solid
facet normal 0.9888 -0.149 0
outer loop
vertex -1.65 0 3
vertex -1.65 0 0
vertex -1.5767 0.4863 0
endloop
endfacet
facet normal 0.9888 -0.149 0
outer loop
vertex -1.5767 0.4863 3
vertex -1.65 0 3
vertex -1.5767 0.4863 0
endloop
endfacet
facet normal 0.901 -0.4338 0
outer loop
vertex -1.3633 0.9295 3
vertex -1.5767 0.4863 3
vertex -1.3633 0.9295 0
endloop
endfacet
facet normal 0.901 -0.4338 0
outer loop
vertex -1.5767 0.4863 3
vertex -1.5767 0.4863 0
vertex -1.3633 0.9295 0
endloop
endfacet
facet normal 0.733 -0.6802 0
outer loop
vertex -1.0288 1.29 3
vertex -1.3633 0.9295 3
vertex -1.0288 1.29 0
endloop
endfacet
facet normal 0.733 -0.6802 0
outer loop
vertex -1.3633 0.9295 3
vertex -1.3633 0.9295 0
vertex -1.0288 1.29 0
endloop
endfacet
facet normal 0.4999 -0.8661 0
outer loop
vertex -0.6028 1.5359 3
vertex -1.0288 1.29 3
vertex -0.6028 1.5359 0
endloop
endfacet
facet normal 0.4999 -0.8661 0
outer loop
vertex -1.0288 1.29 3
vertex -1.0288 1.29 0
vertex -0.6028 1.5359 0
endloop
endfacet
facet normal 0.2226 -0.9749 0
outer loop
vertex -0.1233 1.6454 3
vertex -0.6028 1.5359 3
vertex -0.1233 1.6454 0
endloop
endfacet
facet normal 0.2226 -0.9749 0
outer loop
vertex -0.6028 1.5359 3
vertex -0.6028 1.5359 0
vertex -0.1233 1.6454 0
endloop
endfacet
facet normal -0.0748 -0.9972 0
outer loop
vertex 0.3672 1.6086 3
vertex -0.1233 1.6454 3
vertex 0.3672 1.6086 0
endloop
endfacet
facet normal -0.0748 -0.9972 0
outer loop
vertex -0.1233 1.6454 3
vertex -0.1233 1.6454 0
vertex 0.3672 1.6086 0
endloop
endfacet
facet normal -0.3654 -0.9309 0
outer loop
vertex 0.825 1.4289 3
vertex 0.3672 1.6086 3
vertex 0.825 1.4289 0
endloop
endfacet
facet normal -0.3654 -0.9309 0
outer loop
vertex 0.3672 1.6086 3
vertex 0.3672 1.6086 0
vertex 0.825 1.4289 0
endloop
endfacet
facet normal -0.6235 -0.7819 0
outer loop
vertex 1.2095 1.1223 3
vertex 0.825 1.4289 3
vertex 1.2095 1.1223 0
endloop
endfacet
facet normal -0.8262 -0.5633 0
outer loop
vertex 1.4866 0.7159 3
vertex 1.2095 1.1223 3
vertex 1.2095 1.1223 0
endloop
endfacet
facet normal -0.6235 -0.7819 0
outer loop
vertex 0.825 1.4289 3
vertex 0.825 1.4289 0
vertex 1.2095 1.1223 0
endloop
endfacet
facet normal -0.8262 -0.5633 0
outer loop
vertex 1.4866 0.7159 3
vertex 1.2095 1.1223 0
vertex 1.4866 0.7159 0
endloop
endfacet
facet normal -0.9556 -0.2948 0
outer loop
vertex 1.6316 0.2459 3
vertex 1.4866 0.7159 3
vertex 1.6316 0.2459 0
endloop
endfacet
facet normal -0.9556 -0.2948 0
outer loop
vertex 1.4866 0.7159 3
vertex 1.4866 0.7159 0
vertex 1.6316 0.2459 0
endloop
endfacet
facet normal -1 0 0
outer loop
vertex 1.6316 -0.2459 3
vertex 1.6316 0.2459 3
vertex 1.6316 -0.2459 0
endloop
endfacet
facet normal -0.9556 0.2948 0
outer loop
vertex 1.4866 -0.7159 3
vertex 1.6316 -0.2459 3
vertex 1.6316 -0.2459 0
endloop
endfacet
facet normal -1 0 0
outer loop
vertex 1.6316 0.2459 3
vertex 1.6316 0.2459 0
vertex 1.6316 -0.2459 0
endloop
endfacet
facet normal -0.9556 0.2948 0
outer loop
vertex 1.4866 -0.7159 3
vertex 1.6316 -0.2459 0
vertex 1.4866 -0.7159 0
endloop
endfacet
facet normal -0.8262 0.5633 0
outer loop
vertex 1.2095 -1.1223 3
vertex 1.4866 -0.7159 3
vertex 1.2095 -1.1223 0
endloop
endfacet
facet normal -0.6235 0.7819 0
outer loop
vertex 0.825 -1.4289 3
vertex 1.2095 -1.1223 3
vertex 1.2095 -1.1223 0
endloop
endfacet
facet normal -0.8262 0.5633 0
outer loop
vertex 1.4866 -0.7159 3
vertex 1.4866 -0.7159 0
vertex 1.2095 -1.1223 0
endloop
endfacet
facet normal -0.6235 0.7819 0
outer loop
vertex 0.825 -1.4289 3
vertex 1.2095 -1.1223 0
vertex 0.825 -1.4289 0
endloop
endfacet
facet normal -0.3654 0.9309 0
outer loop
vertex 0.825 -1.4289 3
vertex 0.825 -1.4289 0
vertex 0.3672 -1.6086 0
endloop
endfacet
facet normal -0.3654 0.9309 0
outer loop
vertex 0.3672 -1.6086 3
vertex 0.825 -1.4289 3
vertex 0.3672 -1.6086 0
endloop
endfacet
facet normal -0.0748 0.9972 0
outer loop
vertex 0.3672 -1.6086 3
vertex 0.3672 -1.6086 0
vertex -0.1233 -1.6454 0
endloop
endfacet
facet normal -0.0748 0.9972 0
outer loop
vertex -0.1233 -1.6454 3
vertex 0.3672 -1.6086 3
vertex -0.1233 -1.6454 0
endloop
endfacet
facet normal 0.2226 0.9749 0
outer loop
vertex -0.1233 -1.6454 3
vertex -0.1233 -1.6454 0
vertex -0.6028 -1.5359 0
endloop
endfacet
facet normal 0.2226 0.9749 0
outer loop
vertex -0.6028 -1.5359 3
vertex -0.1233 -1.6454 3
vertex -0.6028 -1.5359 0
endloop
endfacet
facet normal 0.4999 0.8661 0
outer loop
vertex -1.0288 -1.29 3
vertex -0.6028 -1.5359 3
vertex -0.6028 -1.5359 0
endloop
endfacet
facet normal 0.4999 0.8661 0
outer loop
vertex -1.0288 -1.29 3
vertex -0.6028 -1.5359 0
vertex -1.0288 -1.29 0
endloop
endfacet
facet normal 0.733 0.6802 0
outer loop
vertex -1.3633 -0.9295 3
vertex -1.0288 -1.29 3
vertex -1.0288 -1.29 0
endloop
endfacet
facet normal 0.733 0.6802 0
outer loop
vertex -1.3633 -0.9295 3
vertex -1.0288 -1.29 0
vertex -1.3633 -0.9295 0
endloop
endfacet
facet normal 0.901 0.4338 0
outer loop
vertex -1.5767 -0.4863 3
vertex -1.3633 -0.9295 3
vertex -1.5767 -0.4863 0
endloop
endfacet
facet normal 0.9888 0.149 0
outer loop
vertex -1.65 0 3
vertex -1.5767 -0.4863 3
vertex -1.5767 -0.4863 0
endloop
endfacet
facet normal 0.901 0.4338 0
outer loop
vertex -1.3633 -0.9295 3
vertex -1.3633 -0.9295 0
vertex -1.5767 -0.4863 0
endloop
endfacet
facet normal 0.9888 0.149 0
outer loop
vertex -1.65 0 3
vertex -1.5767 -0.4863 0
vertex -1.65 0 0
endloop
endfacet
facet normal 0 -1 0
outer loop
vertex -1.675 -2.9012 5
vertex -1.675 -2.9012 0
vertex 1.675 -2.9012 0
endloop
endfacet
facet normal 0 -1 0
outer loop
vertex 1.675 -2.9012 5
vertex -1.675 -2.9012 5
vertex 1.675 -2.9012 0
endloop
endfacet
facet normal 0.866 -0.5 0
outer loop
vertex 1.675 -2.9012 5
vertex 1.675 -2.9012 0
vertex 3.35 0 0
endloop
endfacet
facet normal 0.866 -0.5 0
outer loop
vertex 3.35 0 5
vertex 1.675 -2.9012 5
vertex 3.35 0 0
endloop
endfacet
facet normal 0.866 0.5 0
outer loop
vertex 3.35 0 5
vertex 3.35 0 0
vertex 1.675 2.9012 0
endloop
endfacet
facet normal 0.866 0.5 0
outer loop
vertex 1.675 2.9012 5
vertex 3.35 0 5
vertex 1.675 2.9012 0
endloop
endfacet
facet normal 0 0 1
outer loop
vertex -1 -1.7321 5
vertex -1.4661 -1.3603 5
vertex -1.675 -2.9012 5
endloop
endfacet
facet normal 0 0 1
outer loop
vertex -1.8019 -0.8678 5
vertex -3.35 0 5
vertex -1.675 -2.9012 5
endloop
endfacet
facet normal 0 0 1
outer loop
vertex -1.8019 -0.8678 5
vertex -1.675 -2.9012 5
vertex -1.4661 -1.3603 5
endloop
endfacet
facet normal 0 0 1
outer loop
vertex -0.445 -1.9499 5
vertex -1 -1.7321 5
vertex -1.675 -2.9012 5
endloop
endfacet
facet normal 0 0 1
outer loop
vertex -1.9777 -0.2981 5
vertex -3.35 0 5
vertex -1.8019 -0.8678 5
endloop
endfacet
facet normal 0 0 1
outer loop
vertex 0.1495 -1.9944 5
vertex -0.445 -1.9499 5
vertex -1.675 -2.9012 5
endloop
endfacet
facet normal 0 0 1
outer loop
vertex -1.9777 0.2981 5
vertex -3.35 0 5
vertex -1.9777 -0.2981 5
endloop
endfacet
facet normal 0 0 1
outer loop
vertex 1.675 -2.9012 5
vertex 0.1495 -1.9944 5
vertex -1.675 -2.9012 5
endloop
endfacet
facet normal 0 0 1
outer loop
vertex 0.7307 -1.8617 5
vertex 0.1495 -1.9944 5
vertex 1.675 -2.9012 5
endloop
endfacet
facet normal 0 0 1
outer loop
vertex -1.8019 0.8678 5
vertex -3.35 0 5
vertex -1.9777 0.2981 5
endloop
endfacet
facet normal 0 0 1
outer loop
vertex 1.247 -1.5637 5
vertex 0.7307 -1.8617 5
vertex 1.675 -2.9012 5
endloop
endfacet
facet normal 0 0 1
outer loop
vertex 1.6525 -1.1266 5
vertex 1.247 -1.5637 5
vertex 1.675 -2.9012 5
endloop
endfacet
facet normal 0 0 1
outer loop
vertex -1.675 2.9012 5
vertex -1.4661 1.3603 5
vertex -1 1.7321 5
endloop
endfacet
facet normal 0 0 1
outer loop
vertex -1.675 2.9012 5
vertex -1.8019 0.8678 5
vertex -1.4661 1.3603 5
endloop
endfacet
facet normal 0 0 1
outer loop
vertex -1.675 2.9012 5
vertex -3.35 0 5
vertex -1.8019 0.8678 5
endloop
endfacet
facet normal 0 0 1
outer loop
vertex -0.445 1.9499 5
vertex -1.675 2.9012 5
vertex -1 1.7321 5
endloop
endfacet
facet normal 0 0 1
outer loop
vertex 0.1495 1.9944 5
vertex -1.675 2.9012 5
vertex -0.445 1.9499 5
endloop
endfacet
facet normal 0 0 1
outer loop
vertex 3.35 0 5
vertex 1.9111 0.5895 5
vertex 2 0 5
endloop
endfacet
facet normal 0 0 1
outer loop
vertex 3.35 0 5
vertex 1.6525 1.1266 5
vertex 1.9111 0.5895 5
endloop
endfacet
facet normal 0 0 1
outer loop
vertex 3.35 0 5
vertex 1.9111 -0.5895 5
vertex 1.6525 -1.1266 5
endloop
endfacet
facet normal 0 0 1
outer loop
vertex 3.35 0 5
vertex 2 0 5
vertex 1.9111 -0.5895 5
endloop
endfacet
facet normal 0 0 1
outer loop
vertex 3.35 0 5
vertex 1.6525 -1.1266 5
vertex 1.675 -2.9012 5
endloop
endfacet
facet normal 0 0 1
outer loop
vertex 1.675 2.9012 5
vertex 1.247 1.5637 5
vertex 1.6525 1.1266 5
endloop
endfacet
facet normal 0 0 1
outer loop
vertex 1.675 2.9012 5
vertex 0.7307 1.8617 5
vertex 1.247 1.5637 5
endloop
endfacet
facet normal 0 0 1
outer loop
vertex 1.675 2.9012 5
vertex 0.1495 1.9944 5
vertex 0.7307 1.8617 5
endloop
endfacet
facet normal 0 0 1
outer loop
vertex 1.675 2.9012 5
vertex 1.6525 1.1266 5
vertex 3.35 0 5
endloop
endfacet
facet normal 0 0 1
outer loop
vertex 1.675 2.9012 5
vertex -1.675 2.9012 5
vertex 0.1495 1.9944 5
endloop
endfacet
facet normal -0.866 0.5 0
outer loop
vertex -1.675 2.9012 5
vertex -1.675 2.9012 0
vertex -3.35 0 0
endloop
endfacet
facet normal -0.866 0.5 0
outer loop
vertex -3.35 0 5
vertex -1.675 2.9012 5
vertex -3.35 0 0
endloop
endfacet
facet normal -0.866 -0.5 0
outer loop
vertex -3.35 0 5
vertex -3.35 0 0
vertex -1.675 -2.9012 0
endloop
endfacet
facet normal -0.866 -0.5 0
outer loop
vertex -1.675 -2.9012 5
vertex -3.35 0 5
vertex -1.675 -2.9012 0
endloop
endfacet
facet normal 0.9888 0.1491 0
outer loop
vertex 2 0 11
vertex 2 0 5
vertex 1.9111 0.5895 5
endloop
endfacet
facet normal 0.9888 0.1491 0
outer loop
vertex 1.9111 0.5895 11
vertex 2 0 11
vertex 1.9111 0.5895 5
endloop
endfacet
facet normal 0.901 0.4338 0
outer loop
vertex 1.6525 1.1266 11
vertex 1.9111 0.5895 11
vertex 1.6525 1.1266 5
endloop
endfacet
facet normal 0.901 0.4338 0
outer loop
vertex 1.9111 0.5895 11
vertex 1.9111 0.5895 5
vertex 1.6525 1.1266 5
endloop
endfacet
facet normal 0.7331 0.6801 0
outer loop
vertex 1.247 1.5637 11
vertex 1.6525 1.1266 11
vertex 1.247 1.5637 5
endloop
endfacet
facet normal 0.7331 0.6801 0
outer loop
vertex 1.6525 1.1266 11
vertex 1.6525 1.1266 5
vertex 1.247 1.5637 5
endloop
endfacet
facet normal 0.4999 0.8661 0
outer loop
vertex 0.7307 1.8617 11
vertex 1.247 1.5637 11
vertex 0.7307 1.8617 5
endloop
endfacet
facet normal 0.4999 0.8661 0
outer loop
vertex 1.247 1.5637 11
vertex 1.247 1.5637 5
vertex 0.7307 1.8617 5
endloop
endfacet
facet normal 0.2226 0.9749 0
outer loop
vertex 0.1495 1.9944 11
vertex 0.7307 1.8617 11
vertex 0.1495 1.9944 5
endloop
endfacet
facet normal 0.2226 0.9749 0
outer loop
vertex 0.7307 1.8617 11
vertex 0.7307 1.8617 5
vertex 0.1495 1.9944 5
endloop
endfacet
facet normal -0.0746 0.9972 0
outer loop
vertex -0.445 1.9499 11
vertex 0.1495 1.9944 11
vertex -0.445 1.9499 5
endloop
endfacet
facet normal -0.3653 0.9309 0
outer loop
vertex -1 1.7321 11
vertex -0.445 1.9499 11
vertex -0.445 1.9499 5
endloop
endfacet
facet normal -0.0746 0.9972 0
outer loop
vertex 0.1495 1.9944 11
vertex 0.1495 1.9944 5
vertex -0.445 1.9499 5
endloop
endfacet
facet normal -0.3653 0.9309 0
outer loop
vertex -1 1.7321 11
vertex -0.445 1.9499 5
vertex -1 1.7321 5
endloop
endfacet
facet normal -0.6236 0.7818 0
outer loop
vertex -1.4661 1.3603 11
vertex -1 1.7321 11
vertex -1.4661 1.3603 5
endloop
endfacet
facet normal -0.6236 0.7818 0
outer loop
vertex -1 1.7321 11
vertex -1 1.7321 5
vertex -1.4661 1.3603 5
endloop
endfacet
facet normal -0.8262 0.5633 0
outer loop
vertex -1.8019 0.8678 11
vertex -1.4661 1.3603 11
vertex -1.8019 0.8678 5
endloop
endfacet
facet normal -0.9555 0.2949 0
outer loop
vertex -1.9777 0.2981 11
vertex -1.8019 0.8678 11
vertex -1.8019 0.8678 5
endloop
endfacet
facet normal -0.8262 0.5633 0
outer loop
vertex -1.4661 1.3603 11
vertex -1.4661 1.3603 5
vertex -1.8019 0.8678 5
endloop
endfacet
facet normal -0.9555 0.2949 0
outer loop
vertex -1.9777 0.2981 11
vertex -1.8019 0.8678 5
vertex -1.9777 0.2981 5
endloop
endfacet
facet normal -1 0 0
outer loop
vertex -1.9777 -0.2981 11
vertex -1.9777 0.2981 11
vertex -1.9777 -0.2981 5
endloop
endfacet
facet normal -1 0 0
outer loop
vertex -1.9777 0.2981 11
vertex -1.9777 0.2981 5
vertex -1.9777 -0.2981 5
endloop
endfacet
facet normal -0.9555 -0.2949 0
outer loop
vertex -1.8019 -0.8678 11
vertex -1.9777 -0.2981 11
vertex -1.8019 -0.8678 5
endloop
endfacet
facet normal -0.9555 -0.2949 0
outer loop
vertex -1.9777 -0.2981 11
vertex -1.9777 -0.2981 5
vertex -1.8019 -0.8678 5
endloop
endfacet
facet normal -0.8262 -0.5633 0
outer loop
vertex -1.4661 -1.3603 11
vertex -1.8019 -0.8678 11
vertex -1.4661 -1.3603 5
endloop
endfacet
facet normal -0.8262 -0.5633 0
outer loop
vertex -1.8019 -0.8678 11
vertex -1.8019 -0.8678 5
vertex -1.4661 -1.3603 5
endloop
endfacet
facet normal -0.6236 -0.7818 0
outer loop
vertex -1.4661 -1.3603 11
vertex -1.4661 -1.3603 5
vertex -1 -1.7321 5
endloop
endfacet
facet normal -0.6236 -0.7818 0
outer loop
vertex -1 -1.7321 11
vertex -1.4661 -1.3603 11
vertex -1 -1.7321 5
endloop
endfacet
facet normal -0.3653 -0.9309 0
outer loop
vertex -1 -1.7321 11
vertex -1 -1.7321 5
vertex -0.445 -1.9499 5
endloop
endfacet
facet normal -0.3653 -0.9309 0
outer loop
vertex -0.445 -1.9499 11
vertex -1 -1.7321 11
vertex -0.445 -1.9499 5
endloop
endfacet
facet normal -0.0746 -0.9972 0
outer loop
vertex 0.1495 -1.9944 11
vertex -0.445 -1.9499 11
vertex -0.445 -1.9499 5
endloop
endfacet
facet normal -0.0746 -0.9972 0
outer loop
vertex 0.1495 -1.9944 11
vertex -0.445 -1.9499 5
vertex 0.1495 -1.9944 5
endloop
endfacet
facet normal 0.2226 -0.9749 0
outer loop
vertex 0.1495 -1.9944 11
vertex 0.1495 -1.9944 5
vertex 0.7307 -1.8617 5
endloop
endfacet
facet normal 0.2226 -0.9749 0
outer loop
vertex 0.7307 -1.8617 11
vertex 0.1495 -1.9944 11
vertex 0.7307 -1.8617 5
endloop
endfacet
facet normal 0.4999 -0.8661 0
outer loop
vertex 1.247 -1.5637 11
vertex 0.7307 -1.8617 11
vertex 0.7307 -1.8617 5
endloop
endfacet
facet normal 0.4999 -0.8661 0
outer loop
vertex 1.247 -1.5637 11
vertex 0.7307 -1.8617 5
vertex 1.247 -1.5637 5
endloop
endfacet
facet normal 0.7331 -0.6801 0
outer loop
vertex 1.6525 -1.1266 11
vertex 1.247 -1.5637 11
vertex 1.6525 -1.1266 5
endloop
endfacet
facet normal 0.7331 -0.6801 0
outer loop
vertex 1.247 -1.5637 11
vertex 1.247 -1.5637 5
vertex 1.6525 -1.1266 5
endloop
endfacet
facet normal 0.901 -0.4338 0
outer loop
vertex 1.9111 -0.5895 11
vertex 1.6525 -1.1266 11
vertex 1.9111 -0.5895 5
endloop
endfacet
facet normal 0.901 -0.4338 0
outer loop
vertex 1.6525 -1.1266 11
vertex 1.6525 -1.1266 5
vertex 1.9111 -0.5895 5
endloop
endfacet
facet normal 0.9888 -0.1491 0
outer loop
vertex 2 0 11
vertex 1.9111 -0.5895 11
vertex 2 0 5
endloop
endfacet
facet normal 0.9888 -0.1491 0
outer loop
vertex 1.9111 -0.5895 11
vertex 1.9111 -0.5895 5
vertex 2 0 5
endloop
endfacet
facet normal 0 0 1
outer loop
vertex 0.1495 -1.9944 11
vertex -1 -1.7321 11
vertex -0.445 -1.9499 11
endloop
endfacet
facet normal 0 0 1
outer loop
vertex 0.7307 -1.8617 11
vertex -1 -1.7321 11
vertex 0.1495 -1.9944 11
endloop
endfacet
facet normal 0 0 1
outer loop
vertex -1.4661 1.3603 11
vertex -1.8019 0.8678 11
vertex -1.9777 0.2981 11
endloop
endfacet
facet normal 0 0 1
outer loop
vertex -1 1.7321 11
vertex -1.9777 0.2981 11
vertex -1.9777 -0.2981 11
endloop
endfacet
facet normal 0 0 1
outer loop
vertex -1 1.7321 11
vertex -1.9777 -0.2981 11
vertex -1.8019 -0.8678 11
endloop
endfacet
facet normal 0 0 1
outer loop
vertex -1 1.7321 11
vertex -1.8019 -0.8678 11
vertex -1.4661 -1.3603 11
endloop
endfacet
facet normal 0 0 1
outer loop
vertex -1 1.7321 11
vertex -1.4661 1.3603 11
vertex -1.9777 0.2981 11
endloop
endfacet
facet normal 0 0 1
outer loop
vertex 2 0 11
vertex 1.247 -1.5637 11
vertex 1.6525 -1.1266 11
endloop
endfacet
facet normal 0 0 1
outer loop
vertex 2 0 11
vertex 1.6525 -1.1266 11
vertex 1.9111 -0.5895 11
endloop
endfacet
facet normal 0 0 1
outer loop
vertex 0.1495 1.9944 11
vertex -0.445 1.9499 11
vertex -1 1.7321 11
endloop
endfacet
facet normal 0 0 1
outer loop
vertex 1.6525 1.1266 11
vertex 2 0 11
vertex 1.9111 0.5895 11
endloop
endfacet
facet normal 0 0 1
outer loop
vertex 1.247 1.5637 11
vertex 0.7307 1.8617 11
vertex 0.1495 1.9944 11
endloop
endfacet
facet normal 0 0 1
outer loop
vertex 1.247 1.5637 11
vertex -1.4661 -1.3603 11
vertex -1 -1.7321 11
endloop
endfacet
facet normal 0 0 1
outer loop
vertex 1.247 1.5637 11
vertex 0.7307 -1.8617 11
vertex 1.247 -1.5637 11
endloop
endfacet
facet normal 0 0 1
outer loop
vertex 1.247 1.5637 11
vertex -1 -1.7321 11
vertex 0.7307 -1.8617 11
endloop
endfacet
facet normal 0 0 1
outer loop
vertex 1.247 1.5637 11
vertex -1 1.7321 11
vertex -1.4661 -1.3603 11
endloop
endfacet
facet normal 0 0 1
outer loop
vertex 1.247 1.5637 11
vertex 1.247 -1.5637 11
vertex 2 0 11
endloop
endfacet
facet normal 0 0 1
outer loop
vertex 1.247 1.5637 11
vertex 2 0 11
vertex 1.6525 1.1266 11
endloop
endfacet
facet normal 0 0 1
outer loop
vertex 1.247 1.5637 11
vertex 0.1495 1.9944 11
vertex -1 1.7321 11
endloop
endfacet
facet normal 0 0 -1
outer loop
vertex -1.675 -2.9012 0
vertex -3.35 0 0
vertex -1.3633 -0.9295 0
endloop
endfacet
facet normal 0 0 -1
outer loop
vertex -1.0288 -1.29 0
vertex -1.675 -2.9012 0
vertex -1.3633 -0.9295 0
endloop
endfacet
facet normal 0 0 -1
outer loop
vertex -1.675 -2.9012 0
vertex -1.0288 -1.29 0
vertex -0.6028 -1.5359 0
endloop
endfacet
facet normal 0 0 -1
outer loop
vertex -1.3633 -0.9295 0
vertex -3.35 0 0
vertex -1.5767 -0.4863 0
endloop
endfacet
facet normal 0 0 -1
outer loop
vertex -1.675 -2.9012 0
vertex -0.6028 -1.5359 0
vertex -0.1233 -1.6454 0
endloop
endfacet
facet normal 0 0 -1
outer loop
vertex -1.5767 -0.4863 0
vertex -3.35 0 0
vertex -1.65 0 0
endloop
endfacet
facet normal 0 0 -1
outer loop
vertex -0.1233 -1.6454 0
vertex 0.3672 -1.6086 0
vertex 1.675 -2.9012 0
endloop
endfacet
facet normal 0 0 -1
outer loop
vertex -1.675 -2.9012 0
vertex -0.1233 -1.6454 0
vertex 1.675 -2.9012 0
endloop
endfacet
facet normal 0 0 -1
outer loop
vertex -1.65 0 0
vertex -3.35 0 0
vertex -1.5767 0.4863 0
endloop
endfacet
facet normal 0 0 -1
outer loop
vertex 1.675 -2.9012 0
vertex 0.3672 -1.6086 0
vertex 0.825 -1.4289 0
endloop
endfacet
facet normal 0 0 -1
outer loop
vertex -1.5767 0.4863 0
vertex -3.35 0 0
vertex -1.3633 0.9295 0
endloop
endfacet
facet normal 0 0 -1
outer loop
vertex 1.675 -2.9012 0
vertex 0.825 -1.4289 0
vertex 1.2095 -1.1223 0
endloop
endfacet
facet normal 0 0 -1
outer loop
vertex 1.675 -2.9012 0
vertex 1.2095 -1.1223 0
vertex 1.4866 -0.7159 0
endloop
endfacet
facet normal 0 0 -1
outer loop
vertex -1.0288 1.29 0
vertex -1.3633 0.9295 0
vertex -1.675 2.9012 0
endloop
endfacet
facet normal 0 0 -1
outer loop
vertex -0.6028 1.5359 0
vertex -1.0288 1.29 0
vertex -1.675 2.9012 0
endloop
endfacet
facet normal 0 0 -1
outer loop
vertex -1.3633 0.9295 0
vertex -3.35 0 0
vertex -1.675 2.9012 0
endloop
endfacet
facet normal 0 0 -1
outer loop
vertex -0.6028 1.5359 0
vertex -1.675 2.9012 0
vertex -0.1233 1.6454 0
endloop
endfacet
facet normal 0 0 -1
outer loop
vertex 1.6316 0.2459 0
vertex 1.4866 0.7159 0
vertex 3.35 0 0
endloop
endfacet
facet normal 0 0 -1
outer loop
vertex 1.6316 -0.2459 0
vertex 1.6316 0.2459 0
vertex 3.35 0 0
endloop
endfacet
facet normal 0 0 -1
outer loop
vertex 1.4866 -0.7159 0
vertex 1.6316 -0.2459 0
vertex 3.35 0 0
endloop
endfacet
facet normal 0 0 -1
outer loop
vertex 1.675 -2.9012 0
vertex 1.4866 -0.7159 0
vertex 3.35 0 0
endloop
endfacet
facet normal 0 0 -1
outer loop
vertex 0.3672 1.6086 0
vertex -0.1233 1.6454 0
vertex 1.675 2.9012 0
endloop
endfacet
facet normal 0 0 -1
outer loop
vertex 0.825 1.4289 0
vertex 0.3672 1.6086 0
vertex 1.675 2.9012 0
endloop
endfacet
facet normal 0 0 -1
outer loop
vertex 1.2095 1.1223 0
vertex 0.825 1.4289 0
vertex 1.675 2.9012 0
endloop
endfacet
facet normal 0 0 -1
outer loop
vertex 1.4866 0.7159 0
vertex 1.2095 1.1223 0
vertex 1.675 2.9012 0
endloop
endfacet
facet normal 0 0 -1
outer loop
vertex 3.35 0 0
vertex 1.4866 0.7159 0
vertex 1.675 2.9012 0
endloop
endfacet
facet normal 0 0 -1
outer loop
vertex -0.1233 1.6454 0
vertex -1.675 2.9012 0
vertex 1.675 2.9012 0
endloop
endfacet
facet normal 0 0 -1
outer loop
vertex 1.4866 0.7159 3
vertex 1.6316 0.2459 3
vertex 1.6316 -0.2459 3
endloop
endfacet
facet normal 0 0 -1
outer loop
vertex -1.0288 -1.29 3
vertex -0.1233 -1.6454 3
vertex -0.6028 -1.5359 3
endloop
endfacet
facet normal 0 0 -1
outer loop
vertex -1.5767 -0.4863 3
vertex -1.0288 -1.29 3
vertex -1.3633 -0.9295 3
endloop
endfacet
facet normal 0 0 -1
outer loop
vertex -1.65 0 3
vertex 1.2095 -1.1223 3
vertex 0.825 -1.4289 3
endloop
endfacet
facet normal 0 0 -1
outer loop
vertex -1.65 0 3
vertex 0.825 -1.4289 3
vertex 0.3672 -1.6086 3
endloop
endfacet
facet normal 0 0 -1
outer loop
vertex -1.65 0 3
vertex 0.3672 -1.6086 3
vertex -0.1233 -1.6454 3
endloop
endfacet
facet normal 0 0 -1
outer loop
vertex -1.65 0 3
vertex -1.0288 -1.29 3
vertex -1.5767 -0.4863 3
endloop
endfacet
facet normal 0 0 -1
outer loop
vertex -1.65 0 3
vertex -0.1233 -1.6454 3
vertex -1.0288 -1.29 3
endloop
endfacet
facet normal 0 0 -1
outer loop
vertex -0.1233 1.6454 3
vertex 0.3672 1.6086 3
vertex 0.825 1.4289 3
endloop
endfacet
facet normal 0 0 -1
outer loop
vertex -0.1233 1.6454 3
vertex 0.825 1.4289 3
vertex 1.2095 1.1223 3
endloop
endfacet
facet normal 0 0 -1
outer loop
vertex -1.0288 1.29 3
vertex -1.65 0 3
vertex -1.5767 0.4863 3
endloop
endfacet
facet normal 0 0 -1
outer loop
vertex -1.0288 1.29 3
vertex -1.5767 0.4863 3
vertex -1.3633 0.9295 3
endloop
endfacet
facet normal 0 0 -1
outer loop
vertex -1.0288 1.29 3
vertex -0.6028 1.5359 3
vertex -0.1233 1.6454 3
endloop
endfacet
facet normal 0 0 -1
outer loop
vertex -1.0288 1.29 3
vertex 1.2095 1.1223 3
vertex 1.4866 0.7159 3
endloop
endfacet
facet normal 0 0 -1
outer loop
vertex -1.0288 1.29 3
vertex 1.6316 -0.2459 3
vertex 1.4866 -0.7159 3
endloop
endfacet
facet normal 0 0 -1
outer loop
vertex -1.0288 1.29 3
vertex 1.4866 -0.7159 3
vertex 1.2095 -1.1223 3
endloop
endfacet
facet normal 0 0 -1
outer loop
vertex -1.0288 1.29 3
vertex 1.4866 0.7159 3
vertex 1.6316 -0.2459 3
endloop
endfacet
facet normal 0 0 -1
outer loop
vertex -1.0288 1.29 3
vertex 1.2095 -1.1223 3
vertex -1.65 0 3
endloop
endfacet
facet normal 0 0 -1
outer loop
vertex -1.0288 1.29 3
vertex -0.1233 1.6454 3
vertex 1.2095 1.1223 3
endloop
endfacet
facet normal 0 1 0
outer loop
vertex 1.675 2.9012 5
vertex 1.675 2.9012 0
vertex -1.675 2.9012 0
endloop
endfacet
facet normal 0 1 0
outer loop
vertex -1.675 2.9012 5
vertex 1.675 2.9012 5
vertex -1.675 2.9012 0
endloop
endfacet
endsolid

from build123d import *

# Parameters (mm, degrees)
EXTRUDE_1_DEPTH     = 5
SKETCH_2_R          = 2
EXTRUDE_2_DEPTH     = 6
SKETCH_3_R          = 1.65
CUT_EXTRUDE_1_DEPTH = 3


with BuildPart() as part:
    # 草圖1 → 填料-伸長1 (new body)
    with BuildSketch(Plane.XY):
        Polygon((-1.675, 2.901185103), (-3.35, 0), (-1.675, -2.901185103), (1.675, -2.901185103), (3.35, 0), (1.675, 2.901185103), align=None)
    extrude(amount=EXTRUDE_1_DEPTH)

    # 草圖2 → 填料-伸長2 (add)
    with BuildSketch(Plane.XY.offset(5)):
        Circle(SKETCH_2_R)
    extrude(amount=EXTRUDE_2_DEPTH)

    # 草圖3 → 除料-伸長1 (cut)
    with BuildSketch(Plane(origin=(0, 0, 0), x_dir=(-1, 0, 0), z_dir=(0, 0, -1))):
        Circle(SKETCH_3_R)
    extrude(amount=-CUT_EXTRUDE_1_DEPTH, mode=Mode.SUBTRACT)


solid = part.part
